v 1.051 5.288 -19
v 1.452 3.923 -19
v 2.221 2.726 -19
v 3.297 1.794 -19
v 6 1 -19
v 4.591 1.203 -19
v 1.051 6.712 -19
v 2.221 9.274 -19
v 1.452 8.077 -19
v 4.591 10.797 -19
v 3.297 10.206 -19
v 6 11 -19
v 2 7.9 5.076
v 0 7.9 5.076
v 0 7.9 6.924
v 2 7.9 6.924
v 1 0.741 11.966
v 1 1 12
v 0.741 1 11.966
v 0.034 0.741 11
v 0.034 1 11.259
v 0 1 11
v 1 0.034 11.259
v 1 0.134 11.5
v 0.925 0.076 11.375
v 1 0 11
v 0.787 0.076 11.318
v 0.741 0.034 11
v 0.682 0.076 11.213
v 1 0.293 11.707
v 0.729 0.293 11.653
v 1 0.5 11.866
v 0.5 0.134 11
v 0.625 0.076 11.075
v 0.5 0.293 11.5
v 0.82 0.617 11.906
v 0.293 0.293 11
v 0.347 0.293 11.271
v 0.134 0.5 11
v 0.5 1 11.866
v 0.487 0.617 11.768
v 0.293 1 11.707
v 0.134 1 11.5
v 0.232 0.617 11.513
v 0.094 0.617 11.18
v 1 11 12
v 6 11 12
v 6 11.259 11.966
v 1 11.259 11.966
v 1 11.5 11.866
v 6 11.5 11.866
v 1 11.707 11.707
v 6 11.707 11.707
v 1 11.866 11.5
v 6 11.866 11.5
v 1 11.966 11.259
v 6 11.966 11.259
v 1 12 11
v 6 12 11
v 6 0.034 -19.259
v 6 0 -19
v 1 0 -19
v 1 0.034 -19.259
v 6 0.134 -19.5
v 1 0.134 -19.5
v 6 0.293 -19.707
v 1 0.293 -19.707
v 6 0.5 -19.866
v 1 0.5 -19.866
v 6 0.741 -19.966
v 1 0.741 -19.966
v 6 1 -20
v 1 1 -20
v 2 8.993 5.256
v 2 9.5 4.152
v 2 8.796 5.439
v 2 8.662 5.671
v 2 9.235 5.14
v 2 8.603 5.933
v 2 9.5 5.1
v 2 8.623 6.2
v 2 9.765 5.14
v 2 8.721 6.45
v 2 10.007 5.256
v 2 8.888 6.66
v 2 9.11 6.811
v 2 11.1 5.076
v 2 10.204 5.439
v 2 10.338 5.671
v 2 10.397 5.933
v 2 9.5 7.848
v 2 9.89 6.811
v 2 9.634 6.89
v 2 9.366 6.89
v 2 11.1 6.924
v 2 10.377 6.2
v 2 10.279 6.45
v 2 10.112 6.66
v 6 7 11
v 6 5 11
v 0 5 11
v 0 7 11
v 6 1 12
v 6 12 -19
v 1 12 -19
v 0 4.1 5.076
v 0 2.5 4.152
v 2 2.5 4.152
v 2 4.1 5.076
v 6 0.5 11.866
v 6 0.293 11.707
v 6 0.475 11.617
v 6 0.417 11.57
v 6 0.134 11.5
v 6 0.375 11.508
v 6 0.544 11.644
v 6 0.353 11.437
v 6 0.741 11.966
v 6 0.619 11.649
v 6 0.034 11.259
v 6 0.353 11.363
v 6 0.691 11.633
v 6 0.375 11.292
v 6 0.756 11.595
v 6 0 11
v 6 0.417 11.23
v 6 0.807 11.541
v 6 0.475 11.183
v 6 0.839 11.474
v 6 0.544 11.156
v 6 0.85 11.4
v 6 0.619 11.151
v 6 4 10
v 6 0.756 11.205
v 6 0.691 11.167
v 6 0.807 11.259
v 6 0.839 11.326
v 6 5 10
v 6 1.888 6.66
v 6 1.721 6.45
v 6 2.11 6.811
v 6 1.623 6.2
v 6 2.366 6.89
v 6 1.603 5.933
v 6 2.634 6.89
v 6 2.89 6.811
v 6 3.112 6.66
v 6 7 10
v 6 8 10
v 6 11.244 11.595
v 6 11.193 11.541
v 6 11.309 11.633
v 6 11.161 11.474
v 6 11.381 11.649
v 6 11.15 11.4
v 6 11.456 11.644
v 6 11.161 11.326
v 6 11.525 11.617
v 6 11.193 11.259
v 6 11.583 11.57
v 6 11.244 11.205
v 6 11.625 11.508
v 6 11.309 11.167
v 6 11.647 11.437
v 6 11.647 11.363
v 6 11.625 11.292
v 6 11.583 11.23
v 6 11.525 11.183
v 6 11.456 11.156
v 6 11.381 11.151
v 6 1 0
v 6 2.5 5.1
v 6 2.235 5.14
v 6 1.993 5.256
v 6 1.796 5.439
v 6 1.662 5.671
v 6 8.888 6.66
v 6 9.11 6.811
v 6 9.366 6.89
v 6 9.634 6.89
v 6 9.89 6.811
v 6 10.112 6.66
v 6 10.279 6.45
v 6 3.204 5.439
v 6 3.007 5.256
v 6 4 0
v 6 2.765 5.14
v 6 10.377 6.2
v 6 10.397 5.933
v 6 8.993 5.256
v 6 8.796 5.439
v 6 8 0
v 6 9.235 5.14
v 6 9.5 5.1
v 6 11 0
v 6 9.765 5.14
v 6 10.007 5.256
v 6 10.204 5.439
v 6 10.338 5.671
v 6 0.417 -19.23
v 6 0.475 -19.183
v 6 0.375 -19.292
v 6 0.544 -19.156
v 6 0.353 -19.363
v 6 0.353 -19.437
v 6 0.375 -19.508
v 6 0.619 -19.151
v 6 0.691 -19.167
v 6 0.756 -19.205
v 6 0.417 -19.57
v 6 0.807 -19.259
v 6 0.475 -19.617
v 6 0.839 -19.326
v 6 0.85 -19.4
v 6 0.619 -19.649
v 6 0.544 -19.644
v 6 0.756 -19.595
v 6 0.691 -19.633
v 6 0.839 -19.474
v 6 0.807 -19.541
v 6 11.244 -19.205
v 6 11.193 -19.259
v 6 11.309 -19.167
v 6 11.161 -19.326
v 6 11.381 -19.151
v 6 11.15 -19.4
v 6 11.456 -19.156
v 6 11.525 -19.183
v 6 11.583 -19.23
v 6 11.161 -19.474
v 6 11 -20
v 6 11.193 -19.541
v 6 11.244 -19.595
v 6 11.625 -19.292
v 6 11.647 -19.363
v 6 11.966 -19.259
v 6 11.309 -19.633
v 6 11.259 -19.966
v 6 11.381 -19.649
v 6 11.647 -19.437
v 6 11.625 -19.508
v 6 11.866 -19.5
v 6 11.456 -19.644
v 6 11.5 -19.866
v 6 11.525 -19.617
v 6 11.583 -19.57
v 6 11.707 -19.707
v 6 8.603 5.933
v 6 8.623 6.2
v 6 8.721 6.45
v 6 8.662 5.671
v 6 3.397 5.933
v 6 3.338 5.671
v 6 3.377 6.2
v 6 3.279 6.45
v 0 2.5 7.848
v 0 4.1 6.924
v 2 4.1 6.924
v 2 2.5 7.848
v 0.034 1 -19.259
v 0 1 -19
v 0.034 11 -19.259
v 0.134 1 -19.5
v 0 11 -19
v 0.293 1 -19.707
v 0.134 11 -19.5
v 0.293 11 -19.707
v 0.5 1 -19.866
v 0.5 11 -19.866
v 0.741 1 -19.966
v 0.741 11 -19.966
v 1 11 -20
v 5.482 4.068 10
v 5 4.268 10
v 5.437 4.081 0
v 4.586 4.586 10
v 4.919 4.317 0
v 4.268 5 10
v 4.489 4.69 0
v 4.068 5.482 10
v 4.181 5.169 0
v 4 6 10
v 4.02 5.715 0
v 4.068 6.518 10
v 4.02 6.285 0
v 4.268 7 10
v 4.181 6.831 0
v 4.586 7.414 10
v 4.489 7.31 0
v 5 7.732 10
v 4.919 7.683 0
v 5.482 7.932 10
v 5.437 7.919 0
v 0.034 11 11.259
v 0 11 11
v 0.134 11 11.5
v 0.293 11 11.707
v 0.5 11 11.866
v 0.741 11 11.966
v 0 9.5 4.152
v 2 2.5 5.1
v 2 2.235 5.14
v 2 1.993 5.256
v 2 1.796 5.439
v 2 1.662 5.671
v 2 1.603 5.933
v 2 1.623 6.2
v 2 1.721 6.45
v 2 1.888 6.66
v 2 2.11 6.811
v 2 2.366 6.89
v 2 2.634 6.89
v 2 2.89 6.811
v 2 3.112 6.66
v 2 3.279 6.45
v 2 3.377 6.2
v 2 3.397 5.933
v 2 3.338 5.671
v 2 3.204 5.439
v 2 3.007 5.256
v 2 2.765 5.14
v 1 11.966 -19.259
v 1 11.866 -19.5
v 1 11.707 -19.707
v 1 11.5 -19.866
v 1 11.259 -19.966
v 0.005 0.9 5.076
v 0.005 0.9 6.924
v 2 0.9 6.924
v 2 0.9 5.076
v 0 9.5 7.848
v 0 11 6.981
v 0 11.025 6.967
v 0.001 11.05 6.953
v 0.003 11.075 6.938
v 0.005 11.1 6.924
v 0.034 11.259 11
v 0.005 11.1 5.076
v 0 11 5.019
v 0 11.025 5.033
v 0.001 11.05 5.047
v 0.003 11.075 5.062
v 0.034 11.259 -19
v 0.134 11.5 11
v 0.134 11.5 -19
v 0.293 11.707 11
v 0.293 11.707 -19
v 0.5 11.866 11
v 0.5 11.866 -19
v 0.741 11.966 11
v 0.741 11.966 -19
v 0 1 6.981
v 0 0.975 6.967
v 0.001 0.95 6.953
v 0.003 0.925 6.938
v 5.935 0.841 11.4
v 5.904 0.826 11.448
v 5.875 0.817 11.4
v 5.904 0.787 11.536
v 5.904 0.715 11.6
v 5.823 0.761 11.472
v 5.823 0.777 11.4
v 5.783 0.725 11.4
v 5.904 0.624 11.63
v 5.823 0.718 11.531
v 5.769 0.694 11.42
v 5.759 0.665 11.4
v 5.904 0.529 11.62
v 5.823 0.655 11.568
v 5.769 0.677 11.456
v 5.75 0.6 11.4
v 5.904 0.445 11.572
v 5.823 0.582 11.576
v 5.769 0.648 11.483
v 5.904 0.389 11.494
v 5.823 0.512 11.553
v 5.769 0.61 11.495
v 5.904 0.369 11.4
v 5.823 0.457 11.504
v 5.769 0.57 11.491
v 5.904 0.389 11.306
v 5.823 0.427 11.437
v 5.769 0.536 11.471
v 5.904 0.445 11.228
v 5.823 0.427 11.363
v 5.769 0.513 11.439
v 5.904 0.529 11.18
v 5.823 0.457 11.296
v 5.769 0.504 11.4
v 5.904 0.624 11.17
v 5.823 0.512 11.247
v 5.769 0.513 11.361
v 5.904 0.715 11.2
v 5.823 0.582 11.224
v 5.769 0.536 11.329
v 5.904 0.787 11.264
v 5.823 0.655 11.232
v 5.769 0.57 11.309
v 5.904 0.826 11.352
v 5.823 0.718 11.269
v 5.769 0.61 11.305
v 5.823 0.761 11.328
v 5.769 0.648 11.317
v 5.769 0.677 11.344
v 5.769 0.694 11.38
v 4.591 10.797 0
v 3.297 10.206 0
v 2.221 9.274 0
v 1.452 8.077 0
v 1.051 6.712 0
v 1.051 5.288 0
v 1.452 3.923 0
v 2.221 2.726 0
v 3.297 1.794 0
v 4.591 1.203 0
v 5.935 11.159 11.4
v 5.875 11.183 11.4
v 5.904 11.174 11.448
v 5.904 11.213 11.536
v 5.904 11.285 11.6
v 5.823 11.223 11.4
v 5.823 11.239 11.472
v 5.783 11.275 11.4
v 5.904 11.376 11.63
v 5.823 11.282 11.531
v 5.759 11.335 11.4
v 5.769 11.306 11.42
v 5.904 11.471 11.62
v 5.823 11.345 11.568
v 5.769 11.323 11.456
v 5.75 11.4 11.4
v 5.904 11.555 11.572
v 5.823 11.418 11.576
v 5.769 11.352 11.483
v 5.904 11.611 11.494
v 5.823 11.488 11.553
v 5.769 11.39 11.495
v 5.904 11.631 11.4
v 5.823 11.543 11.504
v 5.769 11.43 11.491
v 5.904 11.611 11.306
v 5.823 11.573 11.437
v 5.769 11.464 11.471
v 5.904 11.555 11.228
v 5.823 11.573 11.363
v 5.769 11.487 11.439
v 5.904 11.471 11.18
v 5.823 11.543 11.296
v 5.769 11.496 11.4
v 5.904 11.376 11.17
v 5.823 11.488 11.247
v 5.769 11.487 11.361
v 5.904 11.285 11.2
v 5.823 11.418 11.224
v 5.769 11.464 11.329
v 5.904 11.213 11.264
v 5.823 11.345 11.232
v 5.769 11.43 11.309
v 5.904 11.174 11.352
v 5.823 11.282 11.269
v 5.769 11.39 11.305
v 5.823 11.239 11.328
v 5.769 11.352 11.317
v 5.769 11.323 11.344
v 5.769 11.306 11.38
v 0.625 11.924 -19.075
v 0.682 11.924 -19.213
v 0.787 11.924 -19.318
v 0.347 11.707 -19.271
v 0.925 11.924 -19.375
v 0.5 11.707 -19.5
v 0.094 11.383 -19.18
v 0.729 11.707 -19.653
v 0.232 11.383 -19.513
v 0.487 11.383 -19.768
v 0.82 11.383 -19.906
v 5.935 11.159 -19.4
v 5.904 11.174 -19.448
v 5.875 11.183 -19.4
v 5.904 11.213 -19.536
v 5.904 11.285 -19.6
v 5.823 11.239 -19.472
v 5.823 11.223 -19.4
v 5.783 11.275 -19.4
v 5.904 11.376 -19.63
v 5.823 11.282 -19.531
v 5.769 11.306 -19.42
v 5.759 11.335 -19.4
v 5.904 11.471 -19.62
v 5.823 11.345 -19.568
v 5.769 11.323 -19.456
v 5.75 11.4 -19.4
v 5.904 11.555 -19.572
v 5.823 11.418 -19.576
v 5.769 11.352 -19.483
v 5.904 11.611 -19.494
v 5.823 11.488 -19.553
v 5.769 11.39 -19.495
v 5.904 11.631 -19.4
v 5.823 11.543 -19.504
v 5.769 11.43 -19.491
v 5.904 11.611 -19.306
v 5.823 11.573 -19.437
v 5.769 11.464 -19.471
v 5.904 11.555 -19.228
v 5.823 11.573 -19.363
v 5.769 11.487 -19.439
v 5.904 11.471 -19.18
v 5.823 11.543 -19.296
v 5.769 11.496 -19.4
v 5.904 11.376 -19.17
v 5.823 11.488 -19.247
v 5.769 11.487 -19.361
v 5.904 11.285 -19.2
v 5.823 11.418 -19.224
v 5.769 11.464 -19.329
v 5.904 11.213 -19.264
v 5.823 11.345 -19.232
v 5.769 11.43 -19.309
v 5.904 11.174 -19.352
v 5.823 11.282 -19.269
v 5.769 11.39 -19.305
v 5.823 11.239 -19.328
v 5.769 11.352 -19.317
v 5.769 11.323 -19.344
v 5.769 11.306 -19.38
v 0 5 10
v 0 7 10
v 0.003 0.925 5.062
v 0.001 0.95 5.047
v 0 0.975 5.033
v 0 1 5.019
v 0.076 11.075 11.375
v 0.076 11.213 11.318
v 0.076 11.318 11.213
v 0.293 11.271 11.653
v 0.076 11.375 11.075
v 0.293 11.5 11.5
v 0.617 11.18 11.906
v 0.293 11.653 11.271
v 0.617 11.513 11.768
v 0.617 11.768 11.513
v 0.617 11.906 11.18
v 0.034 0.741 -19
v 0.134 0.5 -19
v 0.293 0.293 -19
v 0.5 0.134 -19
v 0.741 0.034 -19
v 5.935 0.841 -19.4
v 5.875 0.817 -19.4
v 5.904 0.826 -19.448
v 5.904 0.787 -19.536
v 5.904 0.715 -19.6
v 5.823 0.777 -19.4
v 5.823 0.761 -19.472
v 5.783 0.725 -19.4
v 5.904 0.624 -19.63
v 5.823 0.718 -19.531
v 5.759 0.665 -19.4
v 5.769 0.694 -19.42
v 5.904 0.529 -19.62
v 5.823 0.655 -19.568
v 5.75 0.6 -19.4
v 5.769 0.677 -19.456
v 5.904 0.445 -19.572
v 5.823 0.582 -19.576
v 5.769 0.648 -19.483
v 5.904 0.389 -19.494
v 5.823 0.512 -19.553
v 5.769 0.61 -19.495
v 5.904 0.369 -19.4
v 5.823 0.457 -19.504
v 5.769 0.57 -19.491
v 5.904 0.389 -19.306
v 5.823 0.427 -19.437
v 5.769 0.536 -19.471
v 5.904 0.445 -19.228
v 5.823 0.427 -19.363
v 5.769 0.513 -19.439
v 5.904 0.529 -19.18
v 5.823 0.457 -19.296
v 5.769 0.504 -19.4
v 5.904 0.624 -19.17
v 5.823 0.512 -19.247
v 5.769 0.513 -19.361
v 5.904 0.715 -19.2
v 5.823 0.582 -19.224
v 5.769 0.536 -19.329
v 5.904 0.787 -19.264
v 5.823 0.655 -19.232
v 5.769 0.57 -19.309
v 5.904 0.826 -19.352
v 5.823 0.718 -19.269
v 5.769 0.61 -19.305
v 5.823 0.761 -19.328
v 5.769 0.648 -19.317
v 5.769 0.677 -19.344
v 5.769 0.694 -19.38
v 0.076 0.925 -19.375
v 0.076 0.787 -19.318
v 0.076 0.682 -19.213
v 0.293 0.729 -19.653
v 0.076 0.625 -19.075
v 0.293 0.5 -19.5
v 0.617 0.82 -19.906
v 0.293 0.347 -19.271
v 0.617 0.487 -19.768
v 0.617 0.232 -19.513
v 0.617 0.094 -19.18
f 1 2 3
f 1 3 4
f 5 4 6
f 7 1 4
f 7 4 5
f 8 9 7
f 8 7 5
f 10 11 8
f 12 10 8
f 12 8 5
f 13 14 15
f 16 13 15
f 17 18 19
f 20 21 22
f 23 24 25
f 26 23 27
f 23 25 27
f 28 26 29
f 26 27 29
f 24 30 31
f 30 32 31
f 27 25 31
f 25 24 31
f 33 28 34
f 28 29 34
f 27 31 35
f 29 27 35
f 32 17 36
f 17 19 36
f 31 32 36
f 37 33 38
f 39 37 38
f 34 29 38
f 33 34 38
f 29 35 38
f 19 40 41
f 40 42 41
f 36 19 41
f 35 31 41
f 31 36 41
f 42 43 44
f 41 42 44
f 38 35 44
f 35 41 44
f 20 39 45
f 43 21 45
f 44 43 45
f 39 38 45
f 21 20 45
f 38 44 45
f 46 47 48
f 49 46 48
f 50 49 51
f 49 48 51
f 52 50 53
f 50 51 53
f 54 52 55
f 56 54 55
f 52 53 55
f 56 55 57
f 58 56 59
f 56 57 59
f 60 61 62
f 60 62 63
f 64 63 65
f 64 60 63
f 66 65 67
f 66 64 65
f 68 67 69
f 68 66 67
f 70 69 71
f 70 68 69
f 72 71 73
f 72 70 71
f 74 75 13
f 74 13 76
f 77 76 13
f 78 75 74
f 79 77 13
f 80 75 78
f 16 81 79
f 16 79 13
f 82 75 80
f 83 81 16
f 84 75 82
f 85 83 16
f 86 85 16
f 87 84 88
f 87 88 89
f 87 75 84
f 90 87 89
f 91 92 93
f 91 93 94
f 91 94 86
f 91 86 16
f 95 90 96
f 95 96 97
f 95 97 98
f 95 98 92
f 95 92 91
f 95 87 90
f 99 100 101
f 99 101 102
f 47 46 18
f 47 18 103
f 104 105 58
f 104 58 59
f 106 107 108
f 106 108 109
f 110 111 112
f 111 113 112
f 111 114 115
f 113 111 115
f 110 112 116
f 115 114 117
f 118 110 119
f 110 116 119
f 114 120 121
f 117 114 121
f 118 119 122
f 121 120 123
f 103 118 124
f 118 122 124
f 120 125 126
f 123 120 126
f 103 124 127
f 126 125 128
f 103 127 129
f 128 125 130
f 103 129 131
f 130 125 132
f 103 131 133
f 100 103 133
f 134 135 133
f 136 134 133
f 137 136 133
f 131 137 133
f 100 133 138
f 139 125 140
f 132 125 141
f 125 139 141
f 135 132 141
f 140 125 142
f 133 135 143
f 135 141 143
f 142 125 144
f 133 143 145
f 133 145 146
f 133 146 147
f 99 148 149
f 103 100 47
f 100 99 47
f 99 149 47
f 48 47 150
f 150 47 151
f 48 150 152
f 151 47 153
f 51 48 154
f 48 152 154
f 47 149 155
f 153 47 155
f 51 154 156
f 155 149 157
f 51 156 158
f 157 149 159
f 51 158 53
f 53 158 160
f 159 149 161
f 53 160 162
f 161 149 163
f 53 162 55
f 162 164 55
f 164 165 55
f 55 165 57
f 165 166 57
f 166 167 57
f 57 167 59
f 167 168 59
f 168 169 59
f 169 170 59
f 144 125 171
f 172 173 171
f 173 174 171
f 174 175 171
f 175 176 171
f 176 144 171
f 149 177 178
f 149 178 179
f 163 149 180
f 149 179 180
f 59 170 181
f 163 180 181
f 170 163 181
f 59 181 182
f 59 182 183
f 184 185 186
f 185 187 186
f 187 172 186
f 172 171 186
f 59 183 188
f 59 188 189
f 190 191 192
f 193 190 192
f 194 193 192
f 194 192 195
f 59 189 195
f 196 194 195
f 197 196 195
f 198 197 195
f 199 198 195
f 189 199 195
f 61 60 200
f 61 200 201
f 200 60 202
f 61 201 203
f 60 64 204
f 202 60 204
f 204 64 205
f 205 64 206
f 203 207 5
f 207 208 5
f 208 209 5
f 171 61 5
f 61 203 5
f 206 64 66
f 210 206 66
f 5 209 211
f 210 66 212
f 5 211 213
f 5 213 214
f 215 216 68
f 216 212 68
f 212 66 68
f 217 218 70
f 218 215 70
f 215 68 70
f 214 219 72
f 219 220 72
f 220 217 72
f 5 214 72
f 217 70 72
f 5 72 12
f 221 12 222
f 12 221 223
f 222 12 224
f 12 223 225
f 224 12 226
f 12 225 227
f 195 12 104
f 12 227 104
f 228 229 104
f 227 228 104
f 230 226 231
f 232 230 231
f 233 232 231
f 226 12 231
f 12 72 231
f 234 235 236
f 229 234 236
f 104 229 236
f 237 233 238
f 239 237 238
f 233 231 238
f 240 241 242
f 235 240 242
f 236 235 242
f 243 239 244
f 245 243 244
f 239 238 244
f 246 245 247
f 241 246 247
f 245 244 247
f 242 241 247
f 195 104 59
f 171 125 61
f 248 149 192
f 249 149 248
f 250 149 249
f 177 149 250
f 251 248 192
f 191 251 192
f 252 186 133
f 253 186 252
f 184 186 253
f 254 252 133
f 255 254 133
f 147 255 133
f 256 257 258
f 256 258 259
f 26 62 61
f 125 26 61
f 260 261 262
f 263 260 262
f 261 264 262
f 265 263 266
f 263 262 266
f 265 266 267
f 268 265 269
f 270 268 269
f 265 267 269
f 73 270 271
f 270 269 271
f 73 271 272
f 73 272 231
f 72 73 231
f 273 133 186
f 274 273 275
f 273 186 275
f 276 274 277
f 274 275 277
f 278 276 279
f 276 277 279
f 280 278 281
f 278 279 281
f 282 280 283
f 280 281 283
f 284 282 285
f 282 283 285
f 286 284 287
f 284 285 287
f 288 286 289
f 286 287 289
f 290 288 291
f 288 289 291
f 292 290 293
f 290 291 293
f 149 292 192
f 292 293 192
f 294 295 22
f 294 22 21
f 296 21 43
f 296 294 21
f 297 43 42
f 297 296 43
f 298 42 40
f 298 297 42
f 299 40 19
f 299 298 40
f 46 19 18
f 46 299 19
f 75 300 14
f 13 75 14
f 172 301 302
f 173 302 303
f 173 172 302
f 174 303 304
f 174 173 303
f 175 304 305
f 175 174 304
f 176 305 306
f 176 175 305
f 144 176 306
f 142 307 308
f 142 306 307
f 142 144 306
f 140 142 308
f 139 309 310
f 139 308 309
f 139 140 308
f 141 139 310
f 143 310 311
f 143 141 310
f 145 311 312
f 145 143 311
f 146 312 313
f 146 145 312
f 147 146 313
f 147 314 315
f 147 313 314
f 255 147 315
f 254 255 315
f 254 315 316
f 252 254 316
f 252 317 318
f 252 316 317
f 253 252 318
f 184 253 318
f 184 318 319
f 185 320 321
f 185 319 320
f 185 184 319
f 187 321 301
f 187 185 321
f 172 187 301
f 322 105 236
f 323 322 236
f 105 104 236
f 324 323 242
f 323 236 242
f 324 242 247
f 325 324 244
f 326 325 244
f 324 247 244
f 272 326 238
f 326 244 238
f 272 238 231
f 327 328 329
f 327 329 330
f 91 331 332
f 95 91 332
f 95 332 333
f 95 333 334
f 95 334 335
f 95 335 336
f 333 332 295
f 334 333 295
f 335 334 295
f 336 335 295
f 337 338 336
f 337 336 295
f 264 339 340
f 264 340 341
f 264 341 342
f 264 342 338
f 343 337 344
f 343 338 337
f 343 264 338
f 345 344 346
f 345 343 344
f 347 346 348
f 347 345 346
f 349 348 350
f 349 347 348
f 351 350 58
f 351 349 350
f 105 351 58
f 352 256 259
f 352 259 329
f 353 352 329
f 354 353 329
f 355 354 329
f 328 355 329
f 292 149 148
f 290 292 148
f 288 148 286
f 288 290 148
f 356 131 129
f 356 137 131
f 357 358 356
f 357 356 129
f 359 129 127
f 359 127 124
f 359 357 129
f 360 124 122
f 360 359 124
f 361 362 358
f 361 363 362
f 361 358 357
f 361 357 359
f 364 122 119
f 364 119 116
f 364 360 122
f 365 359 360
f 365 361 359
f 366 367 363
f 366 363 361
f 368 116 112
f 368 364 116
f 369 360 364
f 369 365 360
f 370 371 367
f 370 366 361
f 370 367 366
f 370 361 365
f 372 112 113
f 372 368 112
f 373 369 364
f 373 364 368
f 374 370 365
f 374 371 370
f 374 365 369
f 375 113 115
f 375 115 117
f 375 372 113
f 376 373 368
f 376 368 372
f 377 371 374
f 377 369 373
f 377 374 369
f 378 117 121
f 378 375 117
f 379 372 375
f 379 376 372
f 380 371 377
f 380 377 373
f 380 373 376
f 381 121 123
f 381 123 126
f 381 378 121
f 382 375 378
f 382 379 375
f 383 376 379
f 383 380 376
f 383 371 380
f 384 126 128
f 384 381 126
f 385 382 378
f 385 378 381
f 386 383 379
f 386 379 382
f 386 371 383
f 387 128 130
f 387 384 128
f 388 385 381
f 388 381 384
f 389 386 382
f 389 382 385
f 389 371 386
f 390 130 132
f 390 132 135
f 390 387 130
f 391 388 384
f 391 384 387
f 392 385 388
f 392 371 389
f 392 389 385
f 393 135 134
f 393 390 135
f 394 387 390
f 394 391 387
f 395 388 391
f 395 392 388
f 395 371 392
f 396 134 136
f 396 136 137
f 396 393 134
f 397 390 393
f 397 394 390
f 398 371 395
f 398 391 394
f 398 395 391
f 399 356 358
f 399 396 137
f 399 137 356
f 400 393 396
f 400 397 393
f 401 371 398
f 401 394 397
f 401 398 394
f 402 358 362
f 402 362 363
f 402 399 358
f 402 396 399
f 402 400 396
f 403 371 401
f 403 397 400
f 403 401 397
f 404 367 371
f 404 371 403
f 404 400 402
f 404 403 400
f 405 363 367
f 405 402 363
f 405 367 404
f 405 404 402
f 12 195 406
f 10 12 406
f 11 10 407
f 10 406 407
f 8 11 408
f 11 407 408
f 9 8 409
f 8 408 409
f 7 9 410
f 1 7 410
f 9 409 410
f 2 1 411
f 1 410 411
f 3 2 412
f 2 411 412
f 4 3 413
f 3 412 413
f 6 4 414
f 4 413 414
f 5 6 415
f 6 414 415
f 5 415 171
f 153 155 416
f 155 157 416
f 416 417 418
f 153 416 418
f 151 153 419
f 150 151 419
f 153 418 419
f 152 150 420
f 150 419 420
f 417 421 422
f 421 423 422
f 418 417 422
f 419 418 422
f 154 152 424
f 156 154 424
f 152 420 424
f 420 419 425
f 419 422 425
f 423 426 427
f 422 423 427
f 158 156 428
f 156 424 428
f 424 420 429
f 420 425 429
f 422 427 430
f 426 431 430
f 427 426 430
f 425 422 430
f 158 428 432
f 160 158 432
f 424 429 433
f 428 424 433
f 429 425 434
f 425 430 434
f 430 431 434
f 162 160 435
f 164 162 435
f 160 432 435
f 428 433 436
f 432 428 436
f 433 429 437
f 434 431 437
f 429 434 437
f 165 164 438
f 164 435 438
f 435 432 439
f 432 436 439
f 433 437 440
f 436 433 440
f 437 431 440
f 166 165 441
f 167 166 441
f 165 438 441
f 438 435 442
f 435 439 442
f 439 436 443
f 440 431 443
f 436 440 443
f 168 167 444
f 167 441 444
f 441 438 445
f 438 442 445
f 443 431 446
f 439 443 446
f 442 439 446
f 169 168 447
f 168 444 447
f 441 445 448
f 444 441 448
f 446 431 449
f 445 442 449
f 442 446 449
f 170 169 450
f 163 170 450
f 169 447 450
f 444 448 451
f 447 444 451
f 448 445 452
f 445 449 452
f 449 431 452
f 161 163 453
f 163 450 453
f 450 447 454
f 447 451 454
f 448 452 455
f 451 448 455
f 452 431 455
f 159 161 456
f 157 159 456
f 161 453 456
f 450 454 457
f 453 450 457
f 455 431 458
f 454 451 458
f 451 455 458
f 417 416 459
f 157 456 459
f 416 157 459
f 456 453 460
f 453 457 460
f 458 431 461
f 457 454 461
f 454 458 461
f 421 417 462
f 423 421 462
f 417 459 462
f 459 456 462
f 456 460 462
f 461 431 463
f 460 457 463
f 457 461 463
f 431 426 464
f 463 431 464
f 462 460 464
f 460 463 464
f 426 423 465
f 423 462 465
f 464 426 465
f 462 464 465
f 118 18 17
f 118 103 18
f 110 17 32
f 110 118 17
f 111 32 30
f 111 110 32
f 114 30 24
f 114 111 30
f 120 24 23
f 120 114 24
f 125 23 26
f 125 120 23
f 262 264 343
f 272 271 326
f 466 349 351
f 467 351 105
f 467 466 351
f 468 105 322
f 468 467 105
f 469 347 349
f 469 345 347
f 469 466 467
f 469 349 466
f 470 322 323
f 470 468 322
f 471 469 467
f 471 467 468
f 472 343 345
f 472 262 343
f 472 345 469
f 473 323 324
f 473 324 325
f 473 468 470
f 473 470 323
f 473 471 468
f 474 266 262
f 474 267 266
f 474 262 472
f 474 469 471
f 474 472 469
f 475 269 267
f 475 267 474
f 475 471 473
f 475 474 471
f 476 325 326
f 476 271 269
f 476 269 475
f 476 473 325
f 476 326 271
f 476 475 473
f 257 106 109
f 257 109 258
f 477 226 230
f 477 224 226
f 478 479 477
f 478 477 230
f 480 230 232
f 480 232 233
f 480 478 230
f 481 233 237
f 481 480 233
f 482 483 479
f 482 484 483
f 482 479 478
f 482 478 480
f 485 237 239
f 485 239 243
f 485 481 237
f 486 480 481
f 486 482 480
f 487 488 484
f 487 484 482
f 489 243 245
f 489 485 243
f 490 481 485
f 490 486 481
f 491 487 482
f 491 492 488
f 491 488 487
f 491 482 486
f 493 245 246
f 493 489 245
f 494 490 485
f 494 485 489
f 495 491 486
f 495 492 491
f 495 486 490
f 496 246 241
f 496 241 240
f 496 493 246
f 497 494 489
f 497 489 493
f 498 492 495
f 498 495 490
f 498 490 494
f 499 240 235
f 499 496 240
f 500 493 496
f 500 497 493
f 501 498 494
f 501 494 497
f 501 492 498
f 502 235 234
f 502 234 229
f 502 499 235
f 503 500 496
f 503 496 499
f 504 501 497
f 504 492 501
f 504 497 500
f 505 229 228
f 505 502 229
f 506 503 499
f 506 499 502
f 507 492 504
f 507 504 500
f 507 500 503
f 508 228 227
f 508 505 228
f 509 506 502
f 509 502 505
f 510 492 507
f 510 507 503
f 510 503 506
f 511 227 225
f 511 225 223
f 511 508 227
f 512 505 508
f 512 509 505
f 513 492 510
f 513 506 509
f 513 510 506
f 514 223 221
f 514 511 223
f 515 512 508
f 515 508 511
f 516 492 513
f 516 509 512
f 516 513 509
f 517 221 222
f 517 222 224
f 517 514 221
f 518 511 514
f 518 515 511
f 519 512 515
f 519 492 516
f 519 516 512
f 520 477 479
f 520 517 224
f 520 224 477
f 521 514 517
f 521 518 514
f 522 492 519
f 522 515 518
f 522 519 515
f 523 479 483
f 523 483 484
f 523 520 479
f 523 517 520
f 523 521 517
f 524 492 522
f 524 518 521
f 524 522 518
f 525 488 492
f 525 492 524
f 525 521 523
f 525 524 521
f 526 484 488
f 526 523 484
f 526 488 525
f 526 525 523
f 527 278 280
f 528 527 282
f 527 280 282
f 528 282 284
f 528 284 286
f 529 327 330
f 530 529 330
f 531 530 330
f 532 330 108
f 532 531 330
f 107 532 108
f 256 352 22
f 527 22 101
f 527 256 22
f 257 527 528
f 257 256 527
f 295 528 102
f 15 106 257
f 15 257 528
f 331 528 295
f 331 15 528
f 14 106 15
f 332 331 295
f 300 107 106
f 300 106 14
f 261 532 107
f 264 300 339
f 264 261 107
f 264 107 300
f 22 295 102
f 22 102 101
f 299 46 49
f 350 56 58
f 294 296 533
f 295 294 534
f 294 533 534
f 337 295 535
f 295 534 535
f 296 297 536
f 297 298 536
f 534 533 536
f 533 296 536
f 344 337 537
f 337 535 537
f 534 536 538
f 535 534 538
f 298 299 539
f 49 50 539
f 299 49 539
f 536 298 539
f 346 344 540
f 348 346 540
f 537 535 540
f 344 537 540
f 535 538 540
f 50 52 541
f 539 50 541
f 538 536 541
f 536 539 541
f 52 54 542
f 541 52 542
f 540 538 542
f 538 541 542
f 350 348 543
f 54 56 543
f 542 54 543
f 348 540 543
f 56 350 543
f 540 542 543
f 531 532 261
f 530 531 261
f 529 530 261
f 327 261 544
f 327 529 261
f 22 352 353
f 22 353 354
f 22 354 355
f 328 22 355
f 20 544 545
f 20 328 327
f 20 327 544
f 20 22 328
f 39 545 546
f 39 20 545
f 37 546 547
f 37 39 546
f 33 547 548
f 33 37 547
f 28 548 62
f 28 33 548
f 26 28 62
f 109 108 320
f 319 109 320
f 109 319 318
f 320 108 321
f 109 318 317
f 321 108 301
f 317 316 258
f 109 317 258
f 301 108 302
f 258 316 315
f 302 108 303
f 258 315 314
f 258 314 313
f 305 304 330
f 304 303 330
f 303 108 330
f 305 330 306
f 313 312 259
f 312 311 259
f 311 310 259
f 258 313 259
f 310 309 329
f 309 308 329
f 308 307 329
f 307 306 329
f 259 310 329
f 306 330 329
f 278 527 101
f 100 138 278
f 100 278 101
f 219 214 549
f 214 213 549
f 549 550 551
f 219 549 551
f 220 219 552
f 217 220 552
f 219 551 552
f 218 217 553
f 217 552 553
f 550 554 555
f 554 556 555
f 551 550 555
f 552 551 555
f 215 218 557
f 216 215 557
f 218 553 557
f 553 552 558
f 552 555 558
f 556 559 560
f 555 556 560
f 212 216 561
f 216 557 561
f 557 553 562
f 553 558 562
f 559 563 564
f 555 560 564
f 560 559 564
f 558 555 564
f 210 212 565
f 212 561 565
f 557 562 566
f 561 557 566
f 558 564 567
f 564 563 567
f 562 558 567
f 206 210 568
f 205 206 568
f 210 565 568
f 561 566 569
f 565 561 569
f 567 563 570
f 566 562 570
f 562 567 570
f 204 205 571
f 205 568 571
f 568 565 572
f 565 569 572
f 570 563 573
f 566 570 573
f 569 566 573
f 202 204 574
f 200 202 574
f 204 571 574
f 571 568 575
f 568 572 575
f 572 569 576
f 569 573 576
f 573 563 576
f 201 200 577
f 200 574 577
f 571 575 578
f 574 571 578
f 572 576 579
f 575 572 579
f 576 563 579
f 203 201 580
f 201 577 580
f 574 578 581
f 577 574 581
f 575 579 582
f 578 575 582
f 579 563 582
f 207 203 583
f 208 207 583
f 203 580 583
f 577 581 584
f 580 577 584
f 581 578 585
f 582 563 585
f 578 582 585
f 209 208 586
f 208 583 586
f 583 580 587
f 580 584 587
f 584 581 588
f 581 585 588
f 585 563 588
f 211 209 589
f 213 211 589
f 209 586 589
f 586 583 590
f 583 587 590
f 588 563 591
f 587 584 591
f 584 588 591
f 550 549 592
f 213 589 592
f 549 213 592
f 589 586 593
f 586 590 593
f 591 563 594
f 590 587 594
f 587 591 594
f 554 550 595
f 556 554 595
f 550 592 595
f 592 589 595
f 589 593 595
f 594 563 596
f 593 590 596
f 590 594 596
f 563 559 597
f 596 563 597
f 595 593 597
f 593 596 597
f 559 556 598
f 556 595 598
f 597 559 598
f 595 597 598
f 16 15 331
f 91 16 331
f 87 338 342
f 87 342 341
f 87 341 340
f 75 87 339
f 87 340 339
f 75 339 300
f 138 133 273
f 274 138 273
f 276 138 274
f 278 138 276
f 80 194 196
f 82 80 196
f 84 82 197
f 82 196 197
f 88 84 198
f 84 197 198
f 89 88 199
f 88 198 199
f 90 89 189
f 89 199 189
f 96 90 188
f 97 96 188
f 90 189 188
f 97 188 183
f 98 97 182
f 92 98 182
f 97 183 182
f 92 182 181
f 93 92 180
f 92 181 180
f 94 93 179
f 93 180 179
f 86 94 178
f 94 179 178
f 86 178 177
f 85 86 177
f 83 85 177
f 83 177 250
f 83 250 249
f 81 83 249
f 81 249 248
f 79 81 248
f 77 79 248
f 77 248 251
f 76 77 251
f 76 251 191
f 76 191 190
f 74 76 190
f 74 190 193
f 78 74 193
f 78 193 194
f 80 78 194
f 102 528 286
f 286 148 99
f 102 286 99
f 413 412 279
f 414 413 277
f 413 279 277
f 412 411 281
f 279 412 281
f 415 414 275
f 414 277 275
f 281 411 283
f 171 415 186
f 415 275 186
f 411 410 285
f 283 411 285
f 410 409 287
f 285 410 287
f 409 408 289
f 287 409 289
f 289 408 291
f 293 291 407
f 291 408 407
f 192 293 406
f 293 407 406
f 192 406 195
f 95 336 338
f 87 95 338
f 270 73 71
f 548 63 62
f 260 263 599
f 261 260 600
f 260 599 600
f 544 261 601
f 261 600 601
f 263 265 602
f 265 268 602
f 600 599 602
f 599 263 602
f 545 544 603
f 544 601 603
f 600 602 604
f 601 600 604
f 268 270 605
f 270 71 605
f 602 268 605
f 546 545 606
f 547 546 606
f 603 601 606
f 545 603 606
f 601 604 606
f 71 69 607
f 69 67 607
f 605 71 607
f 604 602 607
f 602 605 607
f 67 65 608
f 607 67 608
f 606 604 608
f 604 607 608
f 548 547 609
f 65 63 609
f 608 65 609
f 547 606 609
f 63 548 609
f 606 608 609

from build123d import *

# Parameters (mm, degrees)
SKETCH1_W               = 6
SKETCH1_H               = 12
BOSS_EXTRUDE1_DEPTH     = 20
SKETCH2_R               = 5
CUT_EXTRUDE1_DEPTH      = 19
SKETCH6_W               = 6
SKETCH6_H               = 12
BOSS_EXTRUDE3_DEPTH     = 12
SKETCH7_R               = 2
CUT_EXTRUDE2_DEPTH      = 10
CUT_EXTRUDE3_DEPTH      = 25.083189158
CUT_EXTRUDE3_DEPTH_BACK = 25.083189158
SKETCH8_W               = 1
SKETCH8_H               = 2
FILLET1_R               = 1
SKETCH10_R              = 0.9
CUT_EXTRUDE4_DEPTH      = 10
CUT_EXTRUDE5_DEPTH      = 2


with BuildPart() as part:
    # Sketch1 → Boss-Extrude1 (new body)
    with BuildSketch(Plane.XY):
        with Locations((3, 6)):
            Rectangle(SKETCH1_W, SKETCH1_H)
    extrude(amount=-BOSS_EXTRUDE1_DEPTH)

    # Sketch2 → Cut-Extrude1 (cut)
    with BuildSketch(Plane.XY):
        with Locations((6, 6)):
            Circle(SKETCH2_R)
    extrude(amount=-CUT_EXTRUDE1_DEPTH, mode=Mode.SUBTRACT)

    # Sketch6 → Boss-Extrude3 (add)
    with BuildSketch(Plane.XY):
        with Locations((3, 6)):
            Rectangle(SKETCH6_W, SKETCH6_H)
    extrude(amount=BOSS_EXTRUDE3_DEPTH)

    # Sketch7 → Cut-Extrude2 (cut)
    with BuildSketch(Plane(origin=(0, 0, 0), x_dir=(-1, 0, 0), z_dir=(0, 0, -1))):
        with Locations((-6, 6)):
            Circle(SKETCH7_R)
    extrude(amount=-CUT_EXTRUDE2_DEPTH, mode=Mode.SUBTRACT)

    # Sketch8 → Cut-Extrude3 (cut, two sides: drawn at the far end of the back side and taken through both)
    with BuildSketch(Plane.ZY.offset(-CUT_EXTRUDE3_DEPTH_BACK)):
        with Locations((10.5, 6)):
            Rectangle(SKETCH8_W, SKETCH8_H)
    extrude(amount=CUT_EXTRUDE3_DEPTH + CUT_EXTRUDE3_DEPTH_BACK, mode=Mode.SUBTRACT)

    # Fillet1
    fillet1_edges = [part.edges().sort_by_distance(p)[0] for p in [
        (3, 0, -20),
        (3, 12, 12),
        (0, 6, 12),
        (3, 0, 12),
        (0, 6, -20),
        (0, 0, -4),
        (0, 12, -4),
        (3, 12, -20),
    ]]
    fillet(fillet1_edges, radius=FILLET1_R - 0.0001)  # a hair under: the kernel refuses the full size

    # Sketch10 → Cut-Extrude4 (cut)
    with BuildSketch(Plane(origin=(6, 0, 0), x_dir=(0, 0, -1), z_dir=(1, 0, 0))):
        with Locations((-6, 9.5)):
            Circle(SKETCH10_R)
    cut_extrude4 = extrude(amount=-CUT_EXTRUDE4_DEPTH, mode=Mode.SUBTRACT)

    # Sketch12 → Cut-Extrude5 (cut)
    with BuildSketch(Plane.ZY):
        Polygon((6.923760431, 7.9), (7.847520861, 9.5), (6.923760431, 11.1), (5.076239569, 11.1), (4.152479139, 9.5), (5.076239569, 7.9), align=None)
    cut_extrude5 = extrude(amount=-CUT_EXTRUDE5_DEPTH, mode=Mode.SUBTRACT)

    # Mirror1: Cut-Extrude4, Cut-Extrude5 across plane
    add(cut_extrude4.mirror(Plane.ZX.offset(6)), mode=Mode.SUBTRACT)
    add(cut_extrude5.mirror(Plane.ZX.offset(6)), mode=Mode.SUBTRACT)

    # Sketch11 → Cut-Revolve1 (revolve, cut)
    with BuildSketch(Plane(origin=(0, 0, -19.4), x_dir=(-1, 0, 0), z_dir=(0, 0, -1))):
        with BuildLine():
            Line((-5.75, 11.4), (-6, 11.4))
            Line((-6, 11.4), (-6, 11.15))
            ThreePointArc((-6, 11.15), (-5.823223305, 11.223223305), (-5.75, 11.4))
        make_face()
    cut_revolve1 = revolve(axis=Axis((5.75, 11.4, -19.4), (1, 0, 0)), mode=Mode.SUBTRACT)

    # Mirror2: Cut-Revolve1 across plane
    add(cut_revolve1.mirror(Plane.ZX.offset(6)), mode=Mode.SUBTRACT)

    # Mirror2 at the second plane: Cut-Revolve1 across plane
    add(cut_revolve1.mirror(Plane.XY.offset(-4)), mode=Mode.SUBTRACT)

    # Mirror2 at the second plane copy 1 sketc → Mirror2 at the second plane copy 1 (revolve, cut)
    with BuildSketch(Plane(origin=(0, 12, 11.4), x_dir=(-1, 0, 0), z_dir=(0, 0, 1))):
        with BuildLine():
            Line((-5.75, 11.4), (-6, 11.4))
            Line((-6, 11.4), (-6, 11.15))
            ThreePointArc((-6, 11.15), (-5.823223305, 11.223223305), (-5.75, 11.4))
        make_face()
    revolve(axis=Axis((5.75, 0.6, 11.4), (1, 0, 0)), mode=Mode.SUBTRACT)


solid = part.part
